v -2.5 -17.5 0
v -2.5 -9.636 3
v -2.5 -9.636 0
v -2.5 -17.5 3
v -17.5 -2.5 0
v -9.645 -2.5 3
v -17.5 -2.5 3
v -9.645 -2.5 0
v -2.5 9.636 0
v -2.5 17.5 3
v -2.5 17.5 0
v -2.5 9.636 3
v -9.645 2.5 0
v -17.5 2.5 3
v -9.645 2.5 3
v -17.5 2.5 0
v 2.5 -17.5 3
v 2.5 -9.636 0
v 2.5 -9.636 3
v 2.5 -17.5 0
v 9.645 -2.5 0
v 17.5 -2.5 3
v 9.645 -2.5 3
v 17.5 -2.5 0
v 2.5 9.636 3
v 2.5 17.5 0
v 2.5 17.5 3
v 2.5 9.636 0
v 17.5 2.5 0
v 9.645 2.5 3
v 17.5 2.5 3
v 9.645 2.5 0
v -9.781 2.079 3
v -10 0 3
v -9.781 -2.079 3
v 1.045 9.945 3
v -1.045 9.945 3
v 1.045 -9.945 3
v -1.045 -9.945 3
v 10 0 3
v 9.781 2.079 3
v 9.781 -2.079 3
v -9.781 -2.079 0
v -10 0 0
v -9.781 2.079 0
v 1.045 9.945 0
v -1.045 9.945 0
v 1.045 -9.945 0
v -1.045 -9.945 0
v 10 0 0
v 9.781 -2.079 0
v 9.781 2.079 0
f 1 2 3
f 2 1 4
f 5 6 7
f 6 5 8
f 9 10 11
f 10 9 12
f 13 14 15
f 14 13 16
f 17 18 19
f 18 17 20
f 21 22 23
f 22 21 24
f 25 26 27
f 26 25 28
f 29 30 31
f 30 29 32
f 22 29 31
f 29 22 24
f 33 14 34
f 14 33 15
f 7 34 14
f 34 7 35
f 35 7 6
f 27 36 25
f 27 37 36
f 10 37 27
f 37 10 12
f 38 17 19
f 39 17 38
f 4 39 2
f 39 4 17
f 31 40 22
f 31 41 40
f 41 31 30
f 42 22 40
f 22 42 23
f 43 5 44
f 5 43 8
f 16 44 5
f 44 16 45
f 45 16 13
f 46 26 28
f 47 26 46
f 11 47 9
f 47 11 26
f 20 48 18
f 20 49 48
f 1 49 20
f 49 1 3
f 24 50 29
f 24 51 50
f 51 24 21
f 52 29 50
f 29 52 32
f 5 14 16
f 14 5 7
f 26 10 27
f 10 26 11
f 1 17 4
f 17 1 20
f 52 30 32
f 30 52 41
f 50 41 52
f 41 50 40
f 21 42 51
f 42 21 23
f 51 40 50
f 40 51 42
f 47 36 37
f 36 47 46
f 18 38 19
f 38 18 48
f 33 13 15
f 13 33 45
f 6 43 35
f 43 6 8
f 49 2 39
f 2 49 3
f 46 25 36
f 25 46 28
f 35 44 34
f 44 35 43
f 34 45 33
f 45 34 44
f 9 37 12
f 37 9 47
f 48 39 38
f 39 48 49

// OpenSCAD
//green();
red();
//white();



module green()
{
	color("green")
	difference()
	{
		translate([0,0,1])
			cube([30,30,2], center=true);
		white();
		red();
	}
}

module white()
{
		color("white")
		translate([0,0,2.5])
			cylinder(r=10,h=5,center=true, $fn=30);
}

module red()
{
	color("red")
	difference()
	{
		translate([0,0,1.5])
			difference()
			{
				cube([35,35,3], center=true);
				for(x=[-1,1])
					for(y=[-1,1])
						translate([x*20,y*20,0])
							cube([35,35,5], center=true);
			}
		white();
	}
}













































//w();
//g();

module g()
{
	color("green")
		scale([1.01,1.01,1.01])
			translate([9,0,0])
				cube([2,20,20], center=true);
}

module w()
{
	difference()
	{
		color("grey")
			cube([20,20,20], center=true);
		g();
	}
}
